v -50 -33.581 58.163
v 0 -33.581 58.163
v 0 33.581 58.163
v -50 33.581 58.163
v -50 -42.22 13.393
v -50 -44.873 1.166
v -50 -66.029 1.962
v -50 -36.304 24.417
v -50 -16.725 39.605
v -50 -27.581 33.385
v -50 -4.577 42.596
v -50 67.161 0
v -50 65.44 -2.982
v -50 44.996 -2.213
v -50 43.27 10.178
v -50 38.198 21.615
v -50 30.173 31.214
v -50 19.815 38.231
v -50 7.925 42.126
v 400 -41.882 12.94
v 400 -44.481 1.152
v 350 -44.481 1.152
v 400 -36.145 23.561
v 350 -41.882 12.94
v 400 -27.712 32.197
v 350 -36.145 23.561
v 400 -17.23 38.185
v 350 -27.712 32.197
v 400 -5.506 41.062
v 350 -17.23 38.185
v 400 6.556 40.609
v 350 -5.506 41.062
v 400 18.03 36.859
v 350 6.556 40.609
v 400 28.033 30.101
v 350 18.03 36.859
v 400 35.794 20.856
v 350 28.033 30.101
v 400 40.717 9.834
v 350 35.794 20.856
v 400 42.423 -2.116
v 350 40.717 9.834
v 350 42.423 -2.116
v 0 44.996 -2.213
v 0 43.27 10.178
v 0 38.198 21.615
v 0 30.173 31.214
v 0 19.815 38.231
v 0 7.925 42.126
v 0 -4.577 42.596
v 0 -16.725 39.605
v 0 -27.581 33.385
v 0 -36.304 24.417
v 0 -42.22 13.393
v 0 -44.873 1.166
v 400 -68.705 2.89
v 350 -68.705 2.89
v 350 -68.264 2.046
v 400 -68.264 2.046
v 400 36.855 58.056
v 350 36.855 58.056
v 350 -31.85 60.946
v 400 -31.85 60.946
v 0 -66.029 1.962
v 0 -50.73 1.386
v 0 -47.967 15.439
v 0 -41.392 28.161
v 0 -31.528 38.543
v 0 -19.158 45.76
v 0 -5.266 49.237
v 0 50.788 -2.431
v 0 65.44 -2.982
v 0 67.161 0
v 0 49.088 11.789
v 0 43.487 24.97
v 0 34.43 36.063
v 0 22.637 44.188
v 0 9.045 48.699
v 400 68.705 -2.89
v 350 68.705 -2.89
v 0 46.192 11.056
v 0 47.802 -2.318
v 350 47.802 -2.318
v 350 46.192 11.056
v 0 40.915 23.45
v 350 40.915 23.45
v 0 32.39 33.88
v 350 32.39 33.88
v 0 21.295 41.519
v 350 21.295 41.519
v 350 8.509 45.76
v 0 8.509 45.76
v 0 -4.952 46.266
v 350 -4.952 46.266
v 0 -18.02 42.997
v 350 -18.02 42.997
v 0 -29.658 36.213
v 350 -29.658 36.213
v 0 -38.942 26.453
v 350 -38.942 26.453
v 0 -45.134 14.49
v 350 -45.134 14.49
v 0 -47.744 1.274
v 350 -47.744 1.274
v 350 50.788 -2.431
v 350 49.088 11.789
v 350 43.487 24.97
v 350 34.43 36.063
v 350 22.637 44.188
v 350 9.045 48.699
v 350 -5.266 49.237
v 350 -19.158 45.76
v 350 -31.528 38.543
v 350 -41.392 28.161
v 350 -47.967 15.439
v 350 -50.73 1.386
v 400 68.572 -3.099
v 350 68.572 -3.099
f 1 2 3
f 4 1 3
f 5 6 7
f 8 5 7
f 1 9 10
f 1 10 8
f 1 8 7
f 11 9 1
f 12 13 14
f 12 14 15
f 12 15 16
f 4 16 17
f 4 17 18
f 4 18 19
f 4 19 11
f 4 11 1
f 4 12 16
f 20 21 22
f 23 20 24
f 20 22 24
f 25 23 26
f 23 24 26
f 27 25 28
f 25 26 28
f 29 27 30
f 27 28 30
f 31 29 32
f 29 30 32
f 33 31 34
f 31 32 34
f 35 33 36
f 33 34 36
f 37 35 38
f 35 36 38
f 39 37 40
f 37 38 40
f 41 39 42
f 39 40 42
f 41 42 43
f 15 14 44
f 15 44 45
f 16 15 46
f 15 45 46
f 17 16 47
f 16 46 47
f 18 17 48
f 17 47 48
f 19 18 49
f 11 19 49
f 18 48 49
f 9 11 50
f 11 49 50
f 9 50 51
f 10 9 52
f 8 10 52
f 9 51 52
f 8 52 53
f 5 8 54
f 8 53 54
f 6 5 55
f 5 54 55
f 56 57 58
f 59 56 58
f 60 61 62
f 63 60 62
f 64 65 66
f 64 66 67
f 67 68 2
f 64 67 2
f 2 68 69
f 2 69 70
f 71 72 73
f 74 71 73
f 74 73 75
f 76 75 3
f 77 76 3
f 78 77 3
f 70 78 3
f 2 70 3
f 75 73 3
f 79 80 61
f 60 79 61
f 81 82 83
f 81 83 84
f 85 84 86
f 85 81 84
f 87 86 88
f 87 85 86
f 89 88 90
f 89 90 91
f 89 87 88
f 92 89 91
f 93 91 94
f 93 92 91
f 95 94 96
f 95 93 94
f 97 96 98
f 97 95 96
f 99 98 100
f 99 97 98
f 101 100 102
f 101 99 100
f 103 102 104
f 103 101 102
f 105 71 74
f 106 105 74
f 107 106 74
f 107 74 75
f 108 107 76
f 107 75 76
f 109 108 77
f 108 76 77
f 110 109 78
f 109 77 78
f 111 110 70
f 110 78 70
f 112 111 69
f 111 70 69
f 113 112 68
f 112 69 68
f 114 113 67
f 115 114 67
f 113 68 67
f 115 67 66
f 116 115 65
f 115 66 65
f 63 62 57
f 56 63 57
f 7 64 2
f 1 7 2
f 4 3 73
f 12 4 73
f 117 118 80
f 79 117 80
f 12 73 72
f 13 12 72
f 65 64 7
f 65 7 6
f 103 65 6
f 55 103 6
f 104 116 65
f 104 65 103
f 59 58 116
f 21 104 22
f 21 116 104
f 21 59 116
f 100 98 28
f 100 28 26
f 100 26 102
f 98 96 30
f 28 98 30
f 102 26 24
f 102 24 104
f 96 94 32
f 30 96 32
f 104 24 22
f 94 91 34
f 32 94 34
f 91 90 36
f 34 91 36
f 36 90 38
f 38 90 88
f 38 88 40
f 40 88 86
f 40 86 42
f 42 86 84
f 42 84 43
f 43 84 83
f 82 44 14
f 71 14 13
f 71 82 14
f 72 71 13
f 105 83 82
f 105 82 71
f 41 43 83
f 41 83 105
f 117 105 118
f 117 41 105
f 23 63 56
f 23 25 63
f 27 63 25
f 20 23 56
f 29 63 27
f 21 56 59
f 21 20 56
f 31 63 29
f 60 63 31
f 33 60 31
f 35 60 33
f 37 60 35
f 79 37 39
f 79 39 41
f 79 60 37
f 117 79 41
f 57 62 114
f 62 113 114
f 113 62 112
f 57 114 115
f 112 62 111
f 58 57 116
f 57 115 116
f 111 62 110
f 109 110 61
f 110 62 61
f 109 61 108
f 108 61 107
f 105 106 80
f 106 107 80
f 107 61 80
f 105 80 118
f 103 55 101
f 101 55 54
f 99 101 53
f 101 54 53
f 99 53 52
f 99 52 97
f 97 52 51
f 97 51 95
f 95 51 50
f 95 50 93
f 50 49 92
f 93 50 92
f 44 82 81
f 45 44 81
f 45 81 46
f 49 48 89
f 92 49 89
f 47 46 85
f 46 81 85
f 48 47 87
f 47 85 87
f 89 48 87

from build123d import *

# Parameters (mm, degrees)
SKETCH1_R            = 50.800375113
SKETCH1_R_2          = 47.812951641
BOSS_EXTRUDE2_DEPTH  = 350
BOSS_EXTRUDE5_DEPTH  = 50
BOSS_EXTRUDE11_DEPTH = 50
SKETCH6_R            = 44.996318031
CUT_EXTRUDE2_DEPTH   = 50
SKETCH7_R            = 43.517898498
CUT_EXTRUDE3_DEPTH   = 50
CUT_EXTRUDE5_DEPTH   = 460.276368741


with BuildPart() as part:
    # Sketch1 → Boss-Extrude2 (new body)
    with BuildSketch(Plane(origin=(0, 0, 0), x_dir=(0, 0, -1), z_dir=(1, 0, 0))):
        with Locations((1.289702318, 0)):
            Circle(SKETCH1_R)
        with Locations((1.289702318, 0)):
            Circle(SKETCH1_R_2, mode=Mode.SUBTRACT)
    extrude(amount=BOSS_EXTRUDE2_DEPTH)

    # Sketch3 → Boss-Extrude5 (add)
    with BuildSketch(Plane(origin=(350, 0, 0), x_dir=(0, 0, -1), z_dir=(1, 0, 0))):
        Polygon((58.055626726, -36.855405481), (60.945530776, 31.849944836), (2.88990405, 68.705350317), (-58.055626726, 36.855405481), (-60.945530776, -31.849944836), (-2.88990405, -68.705350317), align=None)
        Polygon((29.411876605, -18.99044871), (30.315925302, 11.383738416), (4.46313198, 27.353761118), (-22.293710039, 12.949596693), (-23.197758737, -17.424590433), (2.655034585, -33.394613135), align=None, mode=Mode.SUBTRACT)
    extrude(amount=BOSS_EXTRUDE5_DEPTH)

    # Sketch5 → Boss-Extrude11 (add)
    with BuildSketch(Plane.ZY):
        Polygon((0, -67.161353017), (58.163437865, -33.580676508), (58.163437865, 33.580676508), (0, 67.161353017), (-58.163437865, 33.580676508), (-58.163437865, -33.580676508), align=None)
    extrude(amount=BOSS_EXTRUDE11_DEPTH)

    # Sketch6 → Cut-Extrude2 (cut)
    with BuildSketch(Plane(origin=(0, 0, 0), x_dir=(0, 0, -1), z_dir=(1, 0, 0))):
        with Locations((2.167278034, 0)):
            Circle(SKETCH6_R)
    extrude(amount=-CUT_EXTRUDE2_DEPTH, mode=Mode.SUBTRACT)

    # Sketch7 → Cut-Extrude3 (cut)
    with BuildSketch(Plane.ZY.offset(-350)):
        with Locations((-2.231478452, -1.09442532)):
            Circle(SKETCH7_R)
    extrude(amount=-CUT_EXTRUDE3_DEPTH, mode=Mode.SUBTRACT)

    # Sketch9 → Cut-Extrude5 (cut, through all)
    with BuildSketch(Plane(origin=(400, 0, 0), x_dir=(0, 0, -1), z_dir=(1, 0, 0))):
        Polygon((3.435375401, 77.5085151), (88.372603531, 77.5085151), (88.372603531, -82.273926917), (-2.672776716, -84.939108123), align=None)
    extrude(amount=-CUT_EXTRUDE5_DEPTH, mode=Mode.SUBTRACT)


solid = part.part
